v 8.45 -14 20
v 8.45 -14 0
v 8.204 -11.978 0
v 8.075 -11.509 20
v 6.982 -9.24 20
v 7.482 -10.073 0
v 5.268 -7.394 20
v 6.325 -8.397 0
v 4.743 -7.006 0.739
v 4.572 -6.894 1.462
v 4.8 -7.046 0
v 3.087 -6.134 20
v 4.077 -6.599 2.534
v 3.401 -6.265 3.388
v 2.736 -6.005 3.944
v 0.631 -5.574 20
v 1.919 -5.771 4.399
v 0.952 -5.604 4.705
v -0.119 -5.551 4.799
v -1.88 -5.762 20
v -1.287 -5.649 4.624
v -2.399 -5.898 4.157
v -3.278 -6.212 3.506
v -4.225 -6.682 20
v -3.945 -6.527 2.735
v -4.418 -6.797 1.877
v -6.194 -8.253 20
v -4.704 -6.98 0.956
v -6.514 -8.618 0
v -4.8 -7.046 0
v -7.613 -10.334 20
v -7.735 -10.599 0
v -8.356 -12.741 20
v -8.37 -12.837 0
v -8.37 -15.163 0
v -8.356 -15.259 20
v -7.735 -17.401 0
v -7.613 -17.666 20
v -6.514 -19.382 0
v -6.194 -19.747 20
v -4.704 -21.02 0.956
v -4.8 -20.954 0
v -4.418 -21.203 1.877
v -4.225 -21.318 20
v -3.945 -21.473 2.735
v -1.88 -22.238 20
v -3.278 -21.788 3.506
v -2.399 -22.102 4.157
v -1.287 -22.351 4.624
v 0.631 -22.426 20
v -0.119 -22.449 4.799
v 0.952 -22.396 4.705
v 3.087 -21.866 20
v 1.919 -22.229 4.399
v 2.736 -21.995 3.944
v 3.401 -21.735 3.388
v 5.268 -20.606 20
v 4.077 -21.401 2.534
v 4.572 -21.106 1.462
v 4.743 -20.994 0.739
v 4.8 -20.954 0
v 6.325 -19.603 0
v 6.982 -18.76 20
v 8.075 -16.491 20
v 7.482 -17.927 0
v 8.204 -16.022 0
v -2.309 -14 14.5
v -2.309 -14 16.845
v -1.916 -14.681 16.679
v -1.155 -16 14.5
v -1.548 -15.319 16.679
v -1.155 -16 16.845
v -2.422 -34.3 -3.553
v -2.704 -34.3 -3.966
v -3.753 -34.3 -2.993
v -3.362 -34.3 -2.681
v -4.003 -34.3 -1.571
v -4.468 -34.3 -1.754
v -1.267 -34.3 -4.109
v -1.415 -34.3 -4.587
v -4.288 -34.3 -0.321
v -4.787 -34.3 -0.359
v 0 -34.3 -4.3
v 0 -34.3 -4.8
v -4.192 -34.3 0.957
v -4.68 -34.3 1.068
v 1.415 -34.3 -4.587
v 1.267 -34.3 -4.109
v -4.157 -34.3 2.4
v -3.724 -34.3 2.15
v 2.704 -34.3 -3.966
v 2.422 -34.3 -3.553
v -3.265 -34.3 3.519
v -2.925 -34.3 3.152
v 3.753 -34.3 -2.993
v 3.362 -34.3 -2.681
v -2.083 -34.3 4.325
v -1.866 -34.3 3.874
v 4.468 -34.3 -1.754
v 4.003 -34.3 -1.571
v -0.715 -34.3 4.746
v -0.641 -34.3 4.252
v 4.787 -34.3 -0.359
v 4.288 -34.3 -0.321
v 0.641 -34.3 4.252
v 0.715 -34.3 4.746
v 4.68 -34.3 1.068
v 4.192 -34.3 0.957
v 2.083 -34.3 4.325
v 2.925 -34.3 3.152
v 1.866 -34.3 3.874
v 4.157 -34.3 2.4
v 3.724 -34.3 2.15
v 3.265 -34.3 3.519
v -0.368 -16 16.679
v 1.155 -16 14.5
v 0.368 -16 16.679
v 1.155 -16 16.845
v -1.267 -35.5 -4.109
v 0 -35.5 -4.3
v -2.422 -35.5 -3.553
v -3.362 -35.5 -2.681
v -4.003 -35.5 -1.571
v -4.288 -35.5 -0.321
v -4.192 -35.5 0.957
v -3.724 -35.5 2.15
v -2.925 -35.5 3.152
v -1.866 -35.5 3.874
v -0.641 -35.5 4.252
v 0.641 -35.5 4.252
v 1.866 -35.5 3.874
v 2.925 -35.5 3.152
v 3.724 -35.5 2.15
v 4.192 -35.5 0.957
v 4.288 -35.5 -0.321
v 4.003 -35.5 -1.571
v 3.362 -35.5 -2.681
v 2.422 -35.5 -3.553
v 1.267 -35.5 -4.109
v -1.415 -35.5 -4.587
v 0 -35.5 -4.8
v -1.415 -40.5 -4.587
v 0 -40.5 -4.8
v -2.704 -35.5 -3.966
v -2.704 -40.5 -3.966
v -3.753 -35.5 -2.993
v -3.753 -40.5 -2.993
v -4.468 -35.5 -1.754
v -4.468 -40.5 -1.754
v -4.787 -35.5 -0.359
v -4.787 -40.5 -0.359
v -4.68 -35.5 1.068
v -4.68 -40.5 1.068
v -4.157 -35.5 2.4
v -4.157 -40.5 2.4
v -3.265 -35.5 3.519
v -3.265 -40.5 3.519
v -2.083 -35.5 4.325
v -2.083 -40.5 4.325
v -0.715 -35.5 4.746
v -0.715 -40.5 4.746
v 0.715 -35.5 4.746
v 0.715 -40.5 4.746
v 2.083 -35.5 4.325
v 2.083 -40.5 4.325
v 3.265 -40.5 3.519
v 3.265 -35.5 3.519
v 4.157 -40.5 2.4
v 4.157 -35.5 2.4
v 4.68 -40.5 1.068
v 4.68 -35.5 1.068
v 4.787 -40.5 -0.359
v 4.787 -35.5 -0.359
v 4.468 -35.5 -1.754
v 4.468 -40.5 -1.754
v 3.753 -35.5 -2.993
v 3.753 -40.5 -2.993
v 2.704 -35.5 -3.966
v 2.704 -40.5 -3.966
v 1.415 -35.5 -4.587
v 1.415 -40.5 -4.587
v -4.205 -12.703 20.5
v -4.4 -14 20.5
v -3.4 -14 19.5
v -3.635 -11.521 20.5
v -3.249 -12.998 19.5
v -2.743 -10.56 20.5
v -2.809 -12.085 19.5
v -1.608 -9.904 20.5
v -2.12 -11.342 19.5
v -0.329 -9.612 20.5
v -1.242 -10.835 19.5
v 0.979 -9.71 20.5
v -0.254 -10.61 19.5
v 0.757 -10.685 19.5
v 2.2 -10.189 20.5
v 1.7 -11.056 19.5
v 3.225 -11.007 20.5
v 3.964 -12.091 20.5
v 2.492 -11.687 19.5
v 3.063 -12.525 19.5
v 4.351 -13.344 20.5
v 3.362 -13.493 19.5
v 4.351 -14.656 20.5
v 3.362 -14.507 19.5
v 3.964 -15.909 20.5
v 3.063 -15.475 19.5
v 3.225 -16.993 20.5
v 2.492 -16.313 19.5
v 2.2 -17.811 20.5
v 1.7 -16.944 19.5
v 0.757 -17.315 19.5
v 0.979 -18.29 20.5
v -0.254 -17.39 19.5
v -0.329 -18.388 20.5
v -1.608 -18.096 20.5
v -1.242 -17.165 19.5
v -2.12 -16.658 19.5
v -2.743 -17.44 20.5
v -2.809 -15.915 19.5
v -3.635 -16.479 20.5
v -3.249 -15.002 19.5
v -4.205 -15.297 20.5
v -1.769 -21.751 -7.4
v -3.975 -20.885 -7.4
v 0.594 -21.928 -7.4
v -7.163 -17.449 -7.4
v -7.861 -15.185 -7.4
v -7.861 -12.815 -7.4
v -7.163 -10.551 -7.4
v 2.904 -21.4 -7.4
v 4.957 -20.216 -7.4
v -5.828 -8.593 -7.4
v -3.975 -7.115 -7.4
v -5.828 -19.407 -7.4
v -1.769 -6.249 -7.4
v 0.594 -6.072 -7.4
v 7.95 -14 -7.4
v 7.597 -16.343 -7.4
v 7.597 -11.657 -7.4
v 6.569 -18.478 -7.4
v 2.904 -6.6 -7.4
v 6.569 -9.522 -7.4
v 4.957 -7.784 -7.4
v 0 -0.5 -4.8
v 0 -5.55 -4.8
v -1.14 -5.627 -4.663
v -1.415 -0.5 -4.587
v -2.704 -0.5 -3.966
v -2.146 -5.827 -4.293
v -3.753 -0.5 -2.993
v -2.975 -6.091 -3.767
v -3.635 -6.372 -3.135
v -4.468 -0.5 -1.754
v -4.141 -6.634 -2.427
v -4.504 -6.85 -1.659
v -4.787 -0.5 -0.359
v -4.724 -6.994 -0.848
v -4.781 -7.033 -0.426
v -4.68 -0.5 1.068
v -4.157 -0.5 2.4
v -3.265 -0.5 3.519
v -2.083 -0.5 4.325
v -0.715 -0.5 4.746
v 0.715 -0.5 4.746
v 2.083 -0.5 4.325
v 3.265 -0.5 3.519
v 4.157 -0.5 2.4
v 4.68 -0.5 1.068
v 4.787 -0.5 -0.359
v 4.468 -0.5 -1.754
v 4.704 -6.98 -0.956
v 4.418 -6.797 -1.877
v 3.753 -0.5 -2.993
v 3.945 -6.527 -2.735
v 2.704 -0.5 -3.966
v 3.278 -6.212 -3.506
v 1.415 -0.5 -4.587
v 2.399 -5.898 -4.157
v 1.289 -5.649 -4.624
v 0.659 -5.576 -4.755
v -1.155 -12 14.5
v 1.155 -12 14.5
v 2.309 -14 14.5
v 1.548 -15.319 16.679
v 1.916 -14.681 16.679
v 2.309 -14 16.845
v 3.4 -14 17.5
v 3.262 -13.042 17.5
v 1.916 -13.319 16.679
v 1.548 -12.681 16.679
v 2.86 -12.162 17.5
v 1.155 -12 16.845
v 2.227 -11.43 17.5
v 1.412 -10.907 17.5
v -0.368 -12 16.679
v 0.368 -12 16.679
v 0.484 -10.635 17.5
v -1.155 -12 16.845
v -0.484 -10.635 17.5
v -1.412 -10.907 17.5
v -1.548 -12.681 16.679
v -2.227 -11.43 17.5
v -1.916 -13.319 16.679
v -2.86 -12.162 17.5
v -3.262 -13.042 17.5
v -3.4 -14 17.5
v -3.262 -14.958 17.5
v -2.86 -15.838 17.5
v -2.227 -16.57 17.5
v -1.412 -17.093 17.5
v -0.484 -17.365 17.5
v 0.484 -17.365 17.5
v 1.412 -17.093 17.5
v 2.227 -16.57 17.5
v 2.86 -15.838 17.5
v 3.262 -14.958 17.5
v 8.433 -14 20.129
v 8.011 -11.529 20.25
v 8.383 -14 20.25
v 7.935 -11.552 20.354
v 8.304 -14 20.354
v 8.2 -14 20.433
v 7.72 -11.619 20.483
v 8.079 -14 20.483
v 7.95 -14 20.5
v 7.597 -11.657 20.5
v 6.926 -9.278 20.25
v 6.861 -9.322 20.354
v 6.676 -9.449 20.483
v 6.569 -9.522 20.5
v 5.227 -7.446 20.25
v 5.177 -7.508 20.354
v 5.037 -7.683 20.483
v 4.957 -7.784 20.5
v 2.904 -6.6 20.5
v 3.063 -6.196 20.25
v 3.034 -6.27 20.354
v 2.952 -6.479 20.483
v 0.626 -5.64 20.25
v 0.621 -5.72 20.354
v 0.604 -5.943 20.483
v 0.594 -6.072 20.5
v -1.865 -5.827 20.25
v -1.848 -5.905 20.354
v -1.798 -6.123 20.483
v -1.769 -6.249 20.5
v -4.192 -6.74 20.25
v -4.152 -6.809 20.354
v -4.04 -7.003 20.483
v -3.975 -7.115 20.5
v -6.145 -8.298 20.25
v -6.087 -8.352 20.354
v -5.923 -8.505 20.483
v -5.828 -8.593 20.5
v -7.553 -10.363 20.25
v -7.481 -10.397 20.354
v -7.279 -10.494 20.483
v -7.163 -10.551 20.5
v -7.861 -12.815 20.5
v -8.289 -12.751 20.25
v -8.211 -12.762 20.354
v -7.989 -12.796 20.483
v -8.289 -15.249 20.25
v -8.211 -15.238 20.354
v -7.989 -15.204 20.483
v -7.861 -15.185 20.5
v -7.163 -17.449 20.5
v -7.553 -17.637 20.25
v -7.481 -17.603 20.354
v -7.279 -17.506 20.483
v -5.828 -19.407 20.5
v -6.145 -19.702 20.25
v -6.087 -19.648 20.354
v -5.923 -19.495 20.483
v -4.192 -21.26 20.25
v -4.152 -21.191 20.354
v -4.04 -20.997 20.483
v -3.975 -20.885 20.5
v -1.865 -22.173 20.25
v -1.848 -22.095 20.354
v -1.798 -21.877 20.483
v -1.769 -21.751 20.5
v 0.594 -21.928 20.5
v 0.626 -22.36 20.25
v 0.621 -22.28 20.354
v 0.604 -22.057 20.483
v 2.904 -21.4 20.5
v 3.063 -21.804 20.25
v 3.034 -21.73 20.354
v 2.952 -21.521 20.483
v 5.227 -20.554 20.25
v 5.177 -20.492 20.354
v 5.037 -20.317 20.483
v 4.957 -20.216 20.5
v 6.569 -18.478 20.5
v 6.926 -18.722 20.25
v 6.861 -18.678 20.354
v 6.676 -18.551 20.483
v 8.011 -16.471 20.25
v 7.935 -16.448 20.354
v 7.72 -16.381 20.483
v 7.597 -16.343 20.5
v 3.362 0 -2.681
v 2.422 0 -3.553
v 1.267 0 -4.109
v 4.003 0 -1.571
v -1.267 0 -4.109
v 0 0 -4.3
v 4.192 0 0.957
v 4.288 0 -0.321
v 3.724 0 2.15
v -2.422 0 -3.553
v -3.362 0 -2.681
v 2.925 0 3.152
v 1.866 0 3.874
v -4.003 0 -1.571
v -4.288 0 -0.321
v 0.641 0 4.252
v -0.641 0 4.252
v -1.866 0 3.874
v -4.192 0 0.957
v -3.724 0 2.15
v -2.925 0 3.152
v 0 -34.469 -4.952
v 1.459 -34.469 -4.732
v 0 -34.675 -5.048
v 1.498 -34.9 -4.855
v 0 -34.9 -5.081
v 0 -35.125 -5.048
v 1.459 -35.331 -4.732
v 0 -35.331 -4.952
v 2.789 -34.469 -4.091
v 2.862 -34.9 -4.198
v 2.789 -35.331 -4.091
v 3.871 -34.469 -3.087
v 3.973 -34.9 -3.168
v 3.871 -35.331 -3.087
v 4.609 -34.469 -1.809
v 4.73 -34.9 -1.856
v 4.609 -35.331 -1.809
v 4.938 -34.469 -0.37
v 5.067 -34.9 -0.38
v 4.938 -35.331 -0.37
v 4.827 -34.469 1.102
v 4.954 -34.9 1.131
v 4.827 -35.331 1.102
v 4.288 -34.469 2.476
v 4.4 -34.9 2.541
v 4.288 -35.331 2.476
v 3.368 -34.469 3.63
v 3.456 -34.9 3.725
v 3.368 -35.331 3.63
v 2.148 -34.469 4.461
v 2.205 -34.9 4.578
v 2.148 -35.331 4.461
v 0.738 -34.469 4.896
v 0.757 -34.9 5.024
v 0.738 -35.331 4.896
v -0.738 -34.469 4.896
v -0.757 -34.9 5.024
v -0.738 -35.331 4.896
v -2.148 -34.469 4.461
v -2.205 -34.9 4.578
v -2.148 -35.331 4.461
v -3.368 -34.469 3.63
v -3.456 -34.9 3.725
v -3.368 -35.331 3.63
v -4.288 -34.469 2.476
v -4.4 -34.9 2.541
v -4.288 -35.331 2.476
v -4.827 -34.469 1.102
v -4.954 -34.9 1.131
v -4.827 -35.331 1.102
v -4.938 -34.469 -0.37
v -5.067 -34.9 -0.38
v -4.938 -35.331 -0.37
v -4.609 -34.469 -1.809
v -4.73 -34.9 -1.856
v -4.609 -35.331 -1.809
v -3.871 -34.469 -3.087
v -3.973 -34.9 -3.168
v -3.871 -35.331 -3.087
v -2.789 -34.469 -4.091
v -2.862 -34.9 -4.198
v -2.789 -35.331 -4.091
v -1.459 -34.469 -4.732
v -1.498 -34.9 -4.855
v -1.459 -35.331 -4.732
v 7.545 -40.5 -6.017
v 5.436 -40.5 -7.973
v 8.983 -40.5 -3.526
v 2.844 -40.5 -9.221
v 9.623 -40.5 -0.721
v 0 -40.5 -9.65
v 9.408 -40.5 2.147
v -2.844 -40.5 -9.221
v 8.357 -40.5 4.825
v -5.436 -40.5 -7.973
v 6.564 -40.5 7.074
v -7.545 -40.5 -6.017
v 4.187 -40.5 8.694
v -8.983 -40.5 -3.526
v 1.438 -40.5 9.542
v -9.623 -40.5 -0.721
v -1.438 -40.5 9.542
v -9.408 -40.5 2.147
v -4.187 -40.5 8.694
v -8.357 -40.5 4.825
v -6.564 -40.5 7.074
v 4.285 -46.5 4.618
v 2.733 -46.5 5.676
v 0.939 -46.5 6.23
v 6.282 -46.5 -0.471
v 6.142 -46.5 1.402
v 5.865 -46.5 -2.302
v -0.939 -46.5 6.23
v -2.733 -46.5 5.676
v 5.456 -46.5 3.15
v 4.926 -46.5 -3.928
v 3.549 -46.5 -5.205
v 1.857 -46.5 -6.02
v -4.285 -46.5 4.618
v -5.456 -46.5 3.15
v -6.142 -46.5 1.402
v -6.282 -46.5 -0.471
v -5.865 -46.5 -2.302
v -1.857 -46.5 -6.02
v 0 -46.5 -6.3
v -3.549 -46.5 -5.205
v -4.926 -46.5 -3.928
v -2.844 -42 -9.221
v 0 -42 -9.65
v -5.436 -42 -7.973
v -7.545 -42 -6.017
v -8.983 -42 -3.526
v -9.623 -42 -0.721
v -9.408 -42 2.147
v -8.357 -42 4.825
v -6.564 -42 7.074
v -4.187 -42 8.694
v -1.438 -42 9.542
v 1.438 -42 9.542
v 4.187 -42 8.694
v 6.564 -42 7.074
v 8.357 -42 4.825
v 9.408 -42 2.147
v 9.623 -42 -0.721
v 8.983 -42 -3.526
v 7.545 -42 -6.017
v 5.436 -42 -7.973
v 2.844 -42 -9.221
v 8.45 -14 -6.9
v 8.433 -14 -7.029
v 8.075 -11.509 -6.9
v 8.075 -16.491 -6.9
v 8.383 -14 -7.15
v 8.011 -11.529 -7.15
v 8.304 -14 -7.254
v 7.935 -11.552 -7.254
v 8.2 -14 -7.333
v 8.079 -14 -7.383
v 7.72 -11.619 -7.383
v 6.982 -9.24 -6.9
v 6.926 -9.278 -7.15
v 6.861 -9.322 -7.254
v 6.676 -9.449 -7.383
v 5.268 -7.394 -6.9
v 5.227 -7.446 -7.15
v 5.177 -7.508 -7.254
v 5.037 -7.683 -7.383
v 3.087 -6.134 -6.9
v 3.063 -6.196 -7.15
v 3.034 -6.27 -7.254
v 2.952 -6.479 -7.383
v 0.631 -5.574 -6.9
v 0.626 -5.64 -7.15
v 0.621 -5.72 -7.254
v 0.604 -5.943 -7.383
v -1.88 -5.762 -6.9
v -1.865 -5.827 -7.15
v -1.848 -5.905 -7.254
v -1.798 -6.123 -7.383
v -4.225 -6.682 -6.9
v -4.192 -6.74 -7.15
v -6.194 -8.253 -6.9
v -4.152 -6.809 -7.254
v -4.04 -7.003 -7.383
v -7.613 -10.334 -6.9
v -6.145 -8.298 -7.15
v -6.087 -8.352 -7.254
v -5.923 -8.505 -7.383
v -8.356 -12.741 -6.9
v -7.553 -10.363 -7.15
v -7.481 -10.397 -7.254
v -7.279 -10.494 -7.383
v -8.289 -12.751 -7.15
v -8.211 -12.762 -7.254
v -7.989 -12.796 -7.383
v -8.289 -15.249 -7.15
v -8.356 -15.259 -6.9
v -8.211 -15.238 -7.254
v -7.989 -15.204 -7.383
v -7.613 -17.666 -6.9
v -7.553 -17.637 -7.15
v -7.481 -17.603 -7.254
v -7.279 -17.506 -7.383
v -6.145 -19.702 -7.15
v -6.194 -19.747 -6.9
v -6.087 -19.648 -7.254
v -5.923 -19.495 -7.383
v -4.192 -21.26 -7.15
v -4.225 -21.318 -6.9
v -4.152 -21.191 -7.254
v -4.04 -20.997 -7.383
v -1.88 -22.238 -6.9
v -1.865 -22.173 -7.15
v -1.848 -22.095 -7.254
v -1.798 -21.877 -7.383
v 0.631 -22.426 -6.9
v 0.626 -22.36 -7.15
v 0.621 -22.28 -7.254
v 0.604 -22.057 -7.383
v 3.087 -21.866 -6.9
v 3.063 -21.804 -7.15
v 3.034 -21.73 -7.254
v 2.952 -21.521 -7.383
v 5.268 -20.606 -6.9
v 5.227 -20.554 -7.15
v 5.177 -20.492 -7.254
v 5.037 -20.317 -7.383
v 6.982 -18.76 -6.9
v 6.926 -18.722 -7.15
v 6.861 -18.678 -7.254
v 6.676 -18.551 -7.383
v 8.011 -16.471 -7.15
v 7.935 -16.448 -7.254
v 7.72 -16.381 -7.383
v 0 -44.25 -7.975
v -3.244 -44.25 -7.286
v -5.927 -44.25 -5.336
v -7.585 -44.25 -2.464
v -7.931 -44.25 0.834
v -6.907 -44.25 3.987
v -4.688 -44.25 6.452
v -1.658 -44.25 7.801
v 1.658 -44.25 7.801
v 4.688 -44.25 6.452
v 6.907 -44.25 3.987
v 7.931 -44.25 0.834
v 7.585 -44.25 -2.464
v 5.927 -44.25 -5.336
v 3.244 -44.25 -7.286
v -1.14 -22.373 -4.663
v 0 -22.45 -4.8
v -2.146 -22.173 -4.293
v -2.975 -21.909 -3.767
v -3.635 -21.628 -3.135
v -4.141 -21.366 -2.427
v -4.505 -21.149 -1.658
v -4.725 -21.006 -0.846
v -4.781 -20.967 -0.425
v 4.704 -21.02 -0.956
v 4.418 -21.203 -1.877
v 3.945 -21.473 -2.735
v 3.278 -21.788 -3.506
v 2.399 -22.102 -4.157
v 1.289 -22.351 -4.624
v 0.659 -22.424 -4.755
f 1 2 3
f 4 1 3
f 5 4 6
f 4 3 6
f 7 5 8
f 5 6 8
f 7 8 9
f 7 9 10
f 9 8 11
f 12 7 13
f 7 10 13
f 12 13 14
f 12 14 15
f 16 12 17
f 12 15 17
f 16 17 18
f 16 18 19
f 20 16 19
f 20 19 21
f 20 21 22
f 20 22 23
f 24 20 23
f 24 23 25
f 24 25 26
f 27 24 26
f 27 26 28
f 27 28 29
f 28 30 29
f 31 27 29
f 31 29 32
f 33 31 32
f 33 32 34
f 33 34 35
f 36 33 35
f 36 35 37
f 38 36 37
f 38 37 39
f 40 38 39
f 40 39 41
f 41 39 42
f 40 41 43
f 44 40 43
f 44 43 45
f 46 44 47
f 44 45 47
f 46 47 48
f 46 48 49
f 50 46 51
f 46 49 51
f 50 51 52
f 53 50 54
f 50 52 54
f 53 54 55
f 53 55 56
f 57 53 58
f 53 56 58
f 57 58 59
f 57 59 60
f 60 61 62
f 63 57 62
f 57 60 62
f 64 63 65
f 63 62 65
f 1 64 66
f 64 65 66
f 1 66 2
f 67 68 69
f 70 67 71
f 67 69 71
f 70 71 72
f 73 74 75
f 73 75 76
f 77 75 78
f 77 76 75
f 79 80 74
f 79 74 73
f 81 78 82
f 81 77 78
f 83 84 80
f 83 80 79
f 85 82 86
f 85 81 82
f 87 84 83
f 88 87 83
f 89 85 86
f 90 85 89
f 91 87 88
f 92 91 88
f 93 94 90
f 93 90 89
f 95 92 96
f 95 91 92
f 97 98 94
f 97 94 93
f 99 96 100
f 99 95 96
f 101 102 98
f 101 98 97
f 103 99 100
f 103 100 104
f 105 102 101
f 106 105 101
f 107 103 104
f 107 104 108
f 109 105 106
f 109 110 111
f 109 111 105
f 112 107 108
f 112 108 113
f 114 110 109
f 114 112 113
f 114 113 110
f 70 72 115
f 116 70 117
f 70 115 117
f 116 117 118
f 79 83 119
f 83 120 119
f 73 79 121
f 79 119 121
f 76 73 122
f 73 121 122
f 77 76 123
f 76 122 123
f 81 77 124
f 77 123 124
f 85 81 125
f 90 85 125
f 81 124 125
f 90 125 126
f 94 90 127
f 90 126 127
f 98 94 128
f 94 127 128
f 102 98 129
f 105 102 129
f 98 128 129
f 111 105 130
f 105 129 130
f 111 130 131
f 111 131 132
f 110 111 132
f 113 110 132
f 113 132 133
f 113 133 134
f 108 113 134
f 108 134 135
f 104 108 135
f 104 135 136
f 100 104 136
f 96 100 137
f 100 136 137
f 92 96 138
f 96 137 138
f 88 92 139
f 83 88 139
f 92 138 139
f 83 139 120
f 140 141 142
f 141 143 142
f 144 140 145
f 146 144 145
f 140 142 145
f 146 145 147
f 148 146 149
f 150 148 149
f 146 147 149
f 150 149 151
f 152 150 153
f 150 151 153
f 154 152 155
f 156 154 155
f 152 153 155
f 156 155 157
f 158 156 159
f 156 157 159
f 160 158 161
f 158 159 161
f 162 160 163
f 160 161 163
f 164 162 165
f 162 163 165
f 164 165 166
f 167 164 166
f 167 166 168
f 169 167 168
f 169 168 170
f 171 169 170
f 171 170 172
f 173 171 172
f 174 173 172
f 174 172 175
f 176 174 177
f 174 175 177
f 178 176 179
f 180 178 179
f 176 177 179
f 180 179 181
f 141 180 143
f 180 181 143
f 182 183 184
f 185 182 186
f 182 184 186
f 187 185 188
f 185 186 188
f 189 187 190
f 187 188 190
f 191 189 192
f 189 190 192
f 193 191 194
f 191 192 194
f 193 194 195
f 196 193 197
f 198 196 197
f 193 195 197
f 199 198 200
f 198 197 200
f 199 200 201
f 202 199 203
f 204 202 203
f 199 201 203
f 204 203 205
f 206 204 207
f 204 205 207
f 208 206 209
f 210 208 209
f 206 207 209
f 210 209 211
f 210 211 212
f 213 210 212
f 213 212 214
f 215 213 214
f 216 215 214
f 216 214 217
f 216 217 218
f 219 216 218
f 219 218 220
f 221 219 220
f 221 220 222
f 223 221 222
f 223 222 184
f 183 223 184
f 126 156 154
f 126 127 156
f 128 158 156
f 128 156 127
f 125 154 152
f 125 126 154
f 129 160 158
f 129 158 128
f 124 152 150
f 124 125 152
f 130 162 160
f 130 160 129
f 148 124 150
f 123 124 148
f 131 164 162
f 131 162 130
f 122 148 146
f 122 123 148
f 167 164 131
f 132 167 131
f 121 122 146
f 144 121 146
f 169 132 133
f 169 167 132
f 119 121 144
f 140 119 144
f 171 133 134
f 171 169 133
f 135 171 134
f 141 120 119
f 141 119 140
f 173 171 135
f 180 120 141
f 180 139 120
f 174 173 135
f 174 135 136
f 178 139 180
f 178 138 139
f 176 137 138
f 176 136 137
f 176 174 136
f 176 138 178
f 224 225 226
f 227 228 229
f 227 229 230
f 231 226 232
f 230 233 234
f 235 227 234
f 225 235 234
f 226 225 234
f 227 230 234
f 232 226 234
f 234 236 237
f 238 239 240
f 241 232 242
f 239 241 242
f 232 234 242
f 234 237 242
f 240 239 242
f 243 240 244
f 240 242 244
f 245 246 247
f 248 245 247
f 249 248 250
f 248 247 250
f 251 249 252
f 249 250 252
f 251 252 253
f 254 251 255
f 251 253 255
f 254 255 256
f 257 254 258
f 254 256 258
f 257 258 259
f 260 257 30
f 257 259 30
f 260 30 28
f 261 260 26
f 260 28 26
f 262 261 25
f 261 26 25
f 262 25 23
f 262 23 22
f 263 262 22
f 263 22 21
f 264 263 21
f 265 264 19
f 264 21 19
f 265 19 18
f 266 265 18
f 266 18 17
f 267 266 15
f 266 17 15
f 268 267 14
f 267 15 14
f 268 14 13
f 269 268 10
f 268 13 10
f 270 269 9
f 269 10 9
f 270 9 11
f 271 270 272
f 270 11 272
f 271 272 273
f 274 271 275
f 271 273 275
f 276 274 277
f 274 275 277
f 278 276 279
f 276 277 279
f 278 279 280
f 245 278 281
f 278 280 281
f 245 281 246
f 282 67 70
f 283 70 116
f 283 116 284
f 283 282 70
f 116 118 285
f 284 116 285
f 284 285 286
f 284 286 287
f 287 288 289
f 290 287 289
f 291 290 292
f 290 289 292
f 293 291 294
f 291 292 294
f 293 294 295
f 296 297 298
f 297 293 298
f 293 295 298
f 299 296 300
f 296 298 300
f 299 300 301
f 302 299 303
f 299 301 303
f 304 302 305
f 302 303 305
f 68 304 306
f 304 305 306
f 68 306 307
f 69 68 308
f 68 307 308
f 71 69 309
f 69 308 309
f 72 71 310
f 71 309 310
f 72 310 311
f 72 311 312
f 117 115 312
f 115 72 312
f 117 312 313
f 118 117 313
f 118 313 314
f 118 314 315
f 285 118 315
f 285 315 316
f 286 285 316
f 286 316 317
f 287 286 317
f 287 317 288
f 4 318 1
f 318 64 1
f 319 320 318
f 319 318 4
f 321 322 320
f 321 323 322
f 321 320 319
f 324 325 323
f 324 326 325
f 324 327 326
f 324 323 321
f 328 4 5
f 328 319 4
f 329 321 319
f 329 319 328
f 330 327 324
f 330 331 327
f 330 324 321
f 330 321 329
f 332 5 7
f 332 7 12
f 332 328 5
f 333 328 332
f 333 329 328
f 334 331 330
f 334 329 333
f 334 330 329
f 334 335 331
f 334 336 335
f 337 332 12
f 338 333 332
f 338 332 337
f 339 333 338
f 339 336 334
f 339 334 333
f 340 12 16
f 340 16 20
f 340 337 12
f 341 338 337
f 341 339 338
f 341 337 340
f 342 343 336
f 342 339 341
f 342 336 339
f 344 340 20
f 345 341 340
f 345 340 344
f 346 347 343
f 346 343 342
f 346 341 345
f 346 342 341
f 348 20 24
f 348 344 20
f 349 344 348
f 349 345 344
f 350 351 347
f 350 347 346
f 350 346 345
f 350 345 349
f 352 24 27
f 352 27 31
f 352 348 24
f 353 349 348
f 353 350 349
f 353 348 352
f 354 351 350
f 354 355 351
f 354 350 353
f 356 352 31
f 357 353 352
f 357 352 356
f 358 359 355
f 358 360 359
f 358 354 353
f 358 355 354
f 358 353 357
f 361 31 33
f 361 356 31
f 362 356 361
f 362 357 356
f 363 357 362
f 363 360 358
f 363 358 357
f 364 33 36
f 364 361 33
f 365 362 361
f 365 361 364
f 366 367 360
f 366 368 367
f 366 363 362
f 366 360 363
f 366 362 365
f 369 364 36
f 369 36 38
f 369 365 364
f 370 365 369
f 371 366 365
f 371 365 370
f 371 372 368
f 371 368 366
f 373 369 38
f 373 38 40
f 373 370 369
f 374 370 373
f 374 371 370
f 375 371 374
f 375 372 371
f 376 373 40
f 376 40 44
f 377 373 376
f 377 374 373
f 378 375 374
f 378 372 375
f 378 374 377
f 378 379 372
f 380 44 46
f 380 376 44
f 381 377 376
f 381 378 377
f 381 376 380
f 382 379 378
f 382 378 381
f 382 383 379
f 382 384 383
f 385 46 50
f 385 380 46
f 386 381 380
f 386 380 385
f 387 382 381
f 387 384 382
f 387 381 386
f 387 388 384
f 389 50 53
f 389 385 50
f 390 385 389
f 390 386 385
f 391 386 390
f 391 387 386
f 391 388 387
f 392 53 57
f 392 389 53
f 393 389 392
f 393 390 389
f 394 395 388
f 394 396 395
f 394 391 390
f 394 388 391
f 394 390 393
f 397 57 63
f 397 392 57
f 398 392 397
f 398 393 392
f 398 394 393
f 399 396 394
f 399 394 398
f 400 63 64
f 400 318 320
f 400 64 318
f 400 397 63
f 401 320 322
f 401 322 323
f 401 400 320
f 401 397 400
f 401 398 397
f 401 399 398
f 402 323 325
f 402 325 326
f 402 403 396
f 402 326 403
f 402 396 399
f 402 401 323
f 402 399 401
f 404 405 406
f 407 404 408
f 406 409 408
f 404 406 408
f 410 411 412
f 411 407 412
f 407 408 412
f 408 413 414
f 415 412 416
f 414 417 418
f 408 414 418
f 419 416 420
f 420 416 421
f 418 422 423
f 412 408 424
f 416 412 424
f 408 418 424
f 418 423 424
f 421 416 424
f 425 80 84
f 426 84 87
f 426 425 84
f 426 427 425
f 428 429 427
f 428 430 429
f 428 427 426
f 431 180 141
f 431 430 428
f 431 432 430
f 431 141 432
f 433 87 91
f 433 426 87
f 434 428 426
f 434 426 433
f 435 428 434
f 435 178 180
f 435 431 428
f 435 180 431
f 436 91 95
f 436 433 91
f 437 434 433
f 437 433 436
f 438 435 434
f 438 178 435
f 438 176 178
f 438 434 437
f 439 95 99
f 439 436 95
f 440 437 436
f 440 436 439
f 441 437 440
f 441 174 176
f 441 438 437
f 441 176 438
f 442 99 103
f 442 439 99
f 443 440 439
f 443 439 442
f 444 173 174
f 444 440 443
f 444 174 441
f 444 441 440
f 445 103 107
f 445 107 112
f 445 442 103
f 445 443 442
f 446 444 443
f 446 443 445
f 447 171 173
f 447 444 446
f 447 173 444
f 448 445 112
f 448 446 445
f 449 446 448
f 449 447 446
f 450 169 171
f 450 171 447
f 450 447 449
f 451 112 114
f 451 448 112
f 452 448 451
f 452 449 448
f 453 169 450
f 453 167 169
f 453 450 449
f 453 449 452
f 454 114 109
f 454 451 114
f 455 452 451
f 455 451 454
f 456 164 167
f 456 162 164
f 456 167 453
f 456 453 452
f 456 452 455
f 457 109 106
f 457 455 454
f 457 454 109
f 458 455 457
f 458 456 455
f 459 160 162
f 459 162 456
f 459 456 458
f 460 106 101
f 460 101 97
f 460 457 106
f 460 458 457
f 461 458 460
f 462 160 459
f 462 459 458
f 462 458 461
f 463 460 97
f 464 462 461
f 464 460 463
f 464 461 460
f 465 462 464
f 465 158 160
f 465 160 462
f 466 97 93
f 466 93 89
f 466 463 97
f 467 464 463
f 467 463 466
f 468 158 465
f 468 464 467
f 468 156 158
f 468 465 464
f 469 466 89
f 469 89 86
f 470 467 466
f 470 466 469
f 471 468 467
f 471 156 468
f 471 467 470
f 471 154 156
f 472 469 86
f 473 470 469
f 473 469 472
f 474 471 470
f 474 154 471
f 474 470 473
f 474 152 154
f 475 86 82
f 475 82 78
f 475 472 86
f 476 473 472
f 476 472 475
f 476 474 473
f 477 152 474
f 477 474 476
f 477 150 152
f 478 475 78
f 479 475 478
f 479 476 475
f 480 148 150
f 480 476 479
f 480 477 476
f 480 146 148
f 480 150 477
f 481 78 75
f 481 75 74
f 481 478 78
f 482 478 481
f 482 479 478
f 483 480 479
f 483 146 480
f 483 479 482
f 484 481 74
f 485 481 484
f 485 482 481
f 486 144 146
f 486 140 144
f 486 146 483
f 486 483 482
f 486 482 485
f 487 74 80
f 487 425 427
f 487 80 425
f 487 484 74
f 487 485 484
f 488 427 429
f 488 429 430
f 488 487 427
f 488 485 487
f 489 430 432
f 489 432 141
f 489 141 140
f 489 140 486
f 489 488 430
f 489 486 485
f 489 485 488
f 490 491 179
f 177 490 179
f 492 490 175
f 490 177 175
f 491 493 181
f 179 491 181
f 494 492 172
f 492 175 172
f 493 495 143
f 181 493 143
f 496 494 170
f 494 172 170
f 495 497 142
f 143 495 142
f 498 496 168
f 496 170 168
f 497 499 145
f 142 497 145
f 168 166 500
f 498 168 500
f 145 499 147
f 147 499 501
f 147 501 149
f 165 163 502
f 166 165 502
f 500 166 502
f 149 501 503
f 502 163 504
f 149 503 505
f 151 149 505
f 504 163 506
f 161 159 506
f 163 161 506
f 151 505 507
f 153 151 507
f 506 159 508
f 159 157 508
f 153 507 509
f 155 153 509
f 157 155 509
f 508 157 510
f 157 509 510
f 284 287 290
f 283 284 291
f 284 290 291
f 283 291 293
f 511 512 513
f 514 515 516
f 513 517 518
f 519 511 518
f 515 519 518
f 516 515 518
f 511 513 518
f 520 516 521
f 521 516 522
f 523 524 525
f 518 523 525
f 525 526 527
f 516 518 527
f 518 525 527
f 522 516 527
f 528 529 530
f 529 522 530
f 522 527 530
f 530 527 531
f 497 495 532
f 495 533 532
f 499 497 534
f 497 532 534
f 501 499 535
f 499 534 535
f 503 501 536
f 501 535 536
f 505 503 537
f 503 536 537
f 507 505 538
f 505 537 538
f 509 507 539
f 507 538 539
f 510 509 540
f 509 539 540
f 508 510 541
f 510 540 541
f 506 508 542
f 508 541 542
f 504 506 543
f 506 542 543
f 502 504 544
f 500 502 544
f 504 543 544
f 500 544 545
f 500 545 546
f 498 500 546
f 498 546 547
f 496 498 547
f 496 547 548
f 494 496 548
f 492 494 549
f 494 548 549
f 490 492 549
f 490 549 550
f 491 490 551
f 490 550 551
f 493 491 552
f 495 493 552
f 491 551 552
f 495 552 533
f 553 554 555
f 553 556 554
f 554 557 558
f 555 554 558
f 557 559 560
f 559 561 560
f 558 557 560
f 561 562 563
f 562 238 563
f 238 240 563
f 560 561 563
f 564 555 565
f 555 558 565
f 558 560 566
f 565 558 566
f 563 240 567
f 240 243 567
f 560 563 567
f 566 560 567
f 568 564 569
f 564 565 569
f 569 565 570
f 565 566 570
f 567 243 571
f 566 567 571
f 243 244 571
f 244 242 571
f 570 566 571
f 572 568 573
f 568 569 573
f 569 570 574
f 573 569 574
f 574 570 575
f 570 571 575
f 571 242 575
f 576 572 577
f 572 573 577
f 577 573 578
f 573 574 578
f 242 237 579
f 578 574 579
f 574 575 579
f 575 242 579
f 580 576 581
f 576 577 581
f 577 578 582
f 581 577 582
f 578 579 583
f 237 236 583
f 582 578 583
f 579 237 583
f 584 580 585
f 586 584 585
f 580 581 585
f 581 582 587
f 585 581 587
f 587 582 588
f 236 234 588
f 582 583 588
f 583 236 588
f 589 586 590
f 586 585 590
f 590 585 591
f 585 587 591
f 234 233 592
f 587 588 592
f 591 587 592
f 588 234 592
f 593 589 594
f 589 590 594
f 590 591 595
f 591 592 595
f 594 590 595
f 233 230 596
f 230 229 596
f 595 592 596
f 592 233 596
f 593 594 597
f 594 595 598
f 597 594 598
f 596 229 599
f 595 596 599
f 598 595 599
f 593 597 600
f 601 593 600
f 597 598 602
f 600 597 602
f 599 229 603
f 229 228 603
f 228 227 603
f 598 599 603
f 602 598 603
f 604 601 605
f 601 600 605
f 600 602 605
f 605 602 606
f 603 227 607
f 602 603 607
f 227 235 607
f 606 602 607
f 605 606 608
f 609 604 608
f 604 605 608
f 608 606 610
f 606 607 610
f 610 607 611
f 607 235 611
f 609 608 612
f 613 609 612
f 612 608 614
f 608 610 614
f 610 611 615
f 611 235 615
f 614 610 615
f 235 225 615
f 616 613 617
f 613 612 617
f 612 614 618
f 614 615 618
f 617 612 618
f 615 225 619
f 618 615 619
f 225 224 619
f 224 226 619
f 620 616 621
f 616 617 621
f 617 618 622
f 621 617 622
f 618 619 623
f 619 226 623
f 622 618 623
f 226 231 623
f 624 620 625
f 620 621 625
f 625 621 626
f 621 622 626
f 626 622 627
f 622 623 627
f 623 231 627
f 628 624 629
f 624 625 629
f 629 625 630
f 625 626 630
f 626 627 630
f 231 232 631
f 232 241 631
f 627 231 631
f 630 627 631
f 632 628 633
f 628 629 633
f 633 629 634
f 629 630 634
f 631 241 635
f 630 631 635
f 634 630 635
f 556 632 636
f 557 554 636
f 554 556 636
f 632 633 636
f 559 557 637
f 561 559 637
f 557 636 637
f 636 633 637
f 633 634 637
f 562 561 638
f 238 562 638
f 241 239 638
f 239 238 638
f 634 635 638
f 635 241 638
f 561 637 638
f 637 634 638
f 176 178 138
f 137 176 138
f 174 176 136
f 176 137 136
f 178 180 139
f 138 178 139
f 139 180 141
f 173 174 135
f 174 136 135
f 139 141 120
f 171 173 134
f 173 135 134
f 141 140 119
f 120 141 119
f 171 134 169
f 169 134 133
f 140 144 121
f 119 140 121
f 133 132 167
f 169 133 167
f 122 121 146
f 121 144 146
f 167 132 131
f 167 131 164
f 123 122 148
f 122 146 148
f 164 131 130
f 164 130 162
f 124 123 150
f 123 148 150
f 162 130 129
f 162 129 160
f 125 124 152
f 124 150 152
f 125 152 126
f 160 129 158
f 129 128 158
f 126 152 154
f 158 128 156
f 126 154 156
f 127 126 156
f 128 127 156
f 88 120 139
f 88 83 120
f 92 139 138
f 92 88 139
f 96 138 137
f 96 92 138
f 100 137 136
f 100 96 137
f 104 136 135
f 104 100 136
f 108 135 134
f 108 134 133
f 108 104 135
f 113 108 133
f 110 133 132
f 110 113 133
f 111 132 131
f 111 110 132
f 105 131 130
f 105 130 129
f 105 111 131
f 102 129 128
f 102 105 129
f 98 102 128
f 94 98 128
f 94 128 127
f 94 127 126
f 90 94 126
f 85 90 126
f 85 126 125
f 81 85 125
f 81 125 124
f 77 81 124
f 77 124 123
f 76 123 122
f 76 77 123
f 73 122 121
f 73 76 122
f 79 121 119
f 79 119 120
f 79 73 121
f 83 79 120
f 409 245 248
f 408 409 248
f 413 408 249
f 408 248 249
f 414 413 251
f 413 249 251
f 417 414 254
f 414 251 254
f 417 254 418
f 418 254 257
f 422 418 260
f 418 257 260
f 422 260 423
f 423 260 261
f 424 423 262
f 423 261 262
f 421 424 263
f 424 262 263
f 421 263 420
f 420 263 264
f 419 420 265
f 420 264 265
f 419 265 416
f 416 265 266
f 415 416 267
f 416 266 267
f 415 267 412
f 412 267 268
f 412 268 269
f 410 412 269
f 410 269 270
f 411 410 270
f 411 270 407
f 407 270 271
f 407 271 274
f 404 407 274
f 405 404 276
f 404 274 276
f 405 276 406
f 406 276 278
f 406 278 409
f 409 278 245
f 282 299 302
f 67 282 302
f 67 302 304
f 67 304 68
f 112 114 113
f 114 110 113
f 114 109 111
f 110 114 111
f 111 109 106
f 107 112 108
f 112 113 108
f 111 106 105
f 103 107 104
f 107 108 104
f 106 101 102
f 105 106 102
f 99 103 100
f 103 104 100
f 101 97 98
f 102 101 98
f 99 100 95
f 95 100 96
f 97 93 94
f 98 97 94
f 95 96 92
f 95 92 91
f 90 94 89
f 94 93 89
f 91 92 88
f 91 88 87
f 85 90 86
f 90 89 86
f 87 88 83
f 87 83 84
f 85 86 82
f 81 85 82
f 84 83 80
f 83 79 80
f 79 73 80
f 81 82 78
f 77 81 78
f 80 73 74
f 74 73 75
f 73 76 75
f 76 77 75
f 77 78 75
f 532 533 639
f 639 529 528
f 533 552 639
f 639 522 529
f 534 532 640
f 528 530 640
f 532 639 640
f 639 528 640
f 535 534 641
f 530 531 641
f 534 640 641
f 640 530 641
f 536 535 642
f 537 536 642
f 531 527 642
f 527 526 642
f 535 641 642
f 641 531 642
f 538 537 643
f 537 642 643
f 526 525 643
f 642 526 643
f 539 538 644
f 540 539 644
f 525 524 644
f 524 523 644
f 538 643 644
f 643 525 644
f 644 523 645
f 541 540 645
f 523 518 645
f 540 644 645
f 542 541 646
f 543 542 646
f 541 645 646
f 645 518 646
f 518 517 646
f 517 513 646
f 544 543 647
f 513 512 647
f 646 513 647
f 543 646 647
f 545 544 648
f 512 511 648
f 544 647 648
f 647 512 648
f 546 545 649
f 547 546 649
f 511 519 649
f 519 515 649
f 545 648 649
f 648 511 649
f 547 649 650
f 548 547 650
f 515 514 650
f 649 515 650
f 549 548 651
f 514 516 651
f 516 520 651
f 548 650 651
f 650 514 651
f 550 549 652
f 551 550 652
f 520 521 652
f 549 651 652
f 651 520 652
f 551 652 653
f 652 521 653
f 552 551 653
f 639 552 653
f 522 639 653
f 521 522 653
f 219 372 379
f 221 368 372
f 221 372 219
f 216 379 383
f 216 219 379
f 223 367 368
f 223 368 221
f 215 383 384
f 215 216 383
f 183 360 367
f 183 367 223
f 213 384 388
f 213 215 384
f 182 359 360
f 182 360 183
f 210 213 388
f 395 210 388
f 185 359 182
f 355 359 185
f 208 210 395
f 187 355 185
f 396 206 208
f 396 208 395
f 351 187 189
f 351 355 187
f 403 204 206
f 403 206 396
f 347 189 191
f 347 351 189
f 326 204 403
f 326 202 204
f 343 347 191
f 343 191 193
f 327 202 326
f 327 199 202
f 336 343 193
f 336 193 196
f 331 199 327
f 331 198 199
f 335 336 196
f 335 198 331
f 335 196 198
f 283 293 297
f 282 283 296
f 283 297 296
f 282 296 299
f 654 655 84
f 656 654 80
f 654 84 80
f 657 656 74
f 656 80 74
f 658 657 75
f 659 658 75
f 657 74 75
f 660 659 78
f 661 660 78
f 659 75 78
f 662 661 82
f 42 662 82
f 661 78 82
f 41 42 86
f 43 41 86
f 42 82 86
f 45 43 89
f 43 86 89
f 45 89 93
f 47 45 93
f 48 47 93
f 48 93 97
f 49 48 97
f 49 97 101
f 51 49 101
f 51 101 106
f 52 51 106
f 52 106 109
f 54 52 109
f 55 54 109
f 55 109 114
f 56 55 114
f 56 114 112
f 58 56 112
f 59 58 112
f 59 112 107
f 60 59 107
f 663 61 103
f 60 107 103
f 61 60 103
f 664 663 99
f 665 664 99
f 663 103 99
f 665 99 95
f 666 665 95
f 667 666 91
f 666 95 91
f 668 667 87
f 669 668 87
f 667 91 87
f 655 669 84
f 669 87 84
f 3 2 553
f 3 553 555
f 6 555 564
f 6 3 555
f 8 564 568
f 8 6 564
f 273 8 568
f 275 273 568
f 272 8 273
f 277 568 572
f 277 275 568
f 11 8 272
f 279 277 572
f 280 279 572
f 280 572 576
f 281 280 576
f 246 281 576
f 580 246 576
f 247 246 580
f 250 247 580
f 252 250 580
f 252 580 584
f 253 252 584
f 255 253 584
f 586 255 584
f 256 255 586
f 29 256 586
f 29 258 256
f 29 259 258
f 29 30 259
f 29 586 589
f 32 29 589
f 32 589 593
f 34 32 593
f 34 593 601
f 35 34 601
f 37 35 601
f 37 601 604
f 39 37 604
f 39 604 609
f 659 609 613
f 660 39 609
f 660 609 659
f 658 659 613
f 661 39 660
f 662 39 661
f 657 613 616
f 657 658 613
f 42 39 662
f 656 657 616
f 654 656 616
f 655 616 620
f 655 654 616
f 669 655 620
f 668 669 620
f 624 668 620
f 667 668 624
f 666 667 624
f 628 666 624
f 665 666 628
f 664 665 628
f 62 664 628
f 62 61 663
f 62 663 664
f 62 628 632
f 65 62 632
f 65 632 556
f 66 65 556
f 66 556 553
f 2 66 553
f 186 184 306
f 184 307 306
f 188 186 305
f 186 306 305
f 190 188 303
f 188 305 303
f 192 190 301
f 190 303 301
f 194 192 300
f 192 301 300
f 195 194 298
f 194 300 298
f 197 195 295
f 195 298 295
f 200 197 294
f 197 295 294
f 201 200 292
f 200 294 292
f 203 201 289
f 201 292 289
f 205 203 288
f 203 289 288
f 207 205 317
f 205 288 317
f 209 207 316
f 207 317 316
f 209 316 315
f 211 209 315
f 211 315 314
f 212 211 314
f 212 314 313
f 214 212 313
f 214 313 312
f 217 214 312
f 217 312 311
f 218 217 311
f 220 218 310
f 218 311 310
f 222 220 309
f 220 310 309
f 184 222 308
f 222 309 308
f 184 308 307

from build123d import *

# Parameters (mm, degrees)
CHAMFER_1_SIZE              = 0.5
SKETCH_12_R                 = 8.45
EXTRUDE_2_DEPTH             = 20.5
EXTRUDE_2_DEPTH_BACK        = 7.4
HOLE_WIZARD_M81_D           = 6.8
HOLE_WIZARD_M81_DEPTH       = 3
HOLE_WIZARD_M81_CSINK_D     = 8.8
HOLE_WIZARD_M81_CSINK_ANGLE = 90
HOLE_WIZARD_M81_TIP         = 2.042926105
FILLET_1_R                  = 0.5
CUT_EXTRUDE_2_DEPTH         = 6


with BuildPart() as part:
    # Эскиз3 → Повернуть1 (revolve)
    with BuildSketch(Plane.XY, mode=Mode.PRIVATE) as revolve_1_sk:
        Polygon((0, 0), (-4.8, 0), (-4.8, -34.3), (-4.3, -34.3), (-4.3, -35.5), (-4.8, -35.5), (-4.8, -40.5), (-9.65, -40.5), (-9.65, -42), (-6.3, -46.5), (0, -46.5), align=None)
    revolve(revolve_1_sk.sketch.rotate(Axis((0, 0, 0), (0, 1, 0)), 270), axis=Axis((0, 0, 0), (0, 1, 0)))  # turned: the seam where the file's is

    # Фаска1
    chamfer_1_edges = [part.edges().sort_by_distance(p)[0] for p in [
        (0, 0, 4.8),
    ]]
    chamfer(chamfer_1_edges, length=CHAMFER_1_SIZE)

    # Эскиз12 → Бобышка-Вытянуть2 (add, two sides)
    with BuildSketch(Plane.XY) as extrude_2_sk:
        with Locations((0, -14)):
            Circle(SKETCH_12_R)
    extrude(amount=EXTRUDE_2_DEPTH)
    extrude(extrude_2_sk.sketch, amount=-EXTRUDE_2_DEPTH_BACK)

    # Отверстие обработанное метчиком M81
    with Locations(Plane.XY.offset(20.5)):
        with Locations((0, -14)):
            CounterSinkHole(HOLE_WIZARD_M81_D / 2, HOLE_WIZARD_M81_CSINK_D / 2, depth=HOLE_WIZARD_M81_DEPTH, counter_sink_angle=HOLE_WIZARD_M81_CSINK_ANGLE)
            with Locations((0, 0, -(HOLE_WIZARD_M81_DEPTH + HOLE_WIZARD_M81_TIP / 2))):  # 118° drill point
                Cone(0, HOLE_WIZARD_M81_D / 2, HOLE_WIZARD_M81_TIP, mode=Mode.SUBTRACT)

    # Скругление1
    fillet_1_edges = [part.edges().sort_by_distance(p)[0] for p in [
        (-8.45, -14, -7.4),
        (-8.45, -14, 20.5),
    ]]
    fillet(fillet_1_edges, radius=FILLET_1_R)

    # Эскиз15 → Вырез-Вытянуть2 (cut)
    with BuildSketch(Plane.XY.offset(20.5)):
        Polygon((2.309401077, -14), (1.154700538, -12), (-1.154700538, -12), (-2.309401077, -14), (-1.154700538, -16), (1.154700538, -16), align=None)
    extrude(amount=-CUT_EXTRUDE_2_DEPTH, mode=Mode.SUBTRACT)


with BuildPart() as body_2:
    # Эскиз16 → Повернуть2 (revolve)
    with BuildSketch(Plane.XY, mode=Mode.PRIVATE) as revolve_2_sk:
        with BuildLine():
            Line((-4.3, -34.3), (-4.8, -34.3))
            ThreePointArc((-4.8, -34.3), (-5.081024968, -34.9), (-4.8, -35.5))
            Line((-4.8, -35.5), (-4.3, -35.5))
            Line((-4.3, -35.5), (-4.3, -34.3))
        make_face()
    revolve(revolve_2_sk.sketch.rotate(Axis((0, -34.3, 0), (0, -1, 0)), 90), axis=Axis((0, -34.3, 0), (0, -1, 0)))  # turned: the seam where the file's is


solid = Compound([part.part, body_2.part])
